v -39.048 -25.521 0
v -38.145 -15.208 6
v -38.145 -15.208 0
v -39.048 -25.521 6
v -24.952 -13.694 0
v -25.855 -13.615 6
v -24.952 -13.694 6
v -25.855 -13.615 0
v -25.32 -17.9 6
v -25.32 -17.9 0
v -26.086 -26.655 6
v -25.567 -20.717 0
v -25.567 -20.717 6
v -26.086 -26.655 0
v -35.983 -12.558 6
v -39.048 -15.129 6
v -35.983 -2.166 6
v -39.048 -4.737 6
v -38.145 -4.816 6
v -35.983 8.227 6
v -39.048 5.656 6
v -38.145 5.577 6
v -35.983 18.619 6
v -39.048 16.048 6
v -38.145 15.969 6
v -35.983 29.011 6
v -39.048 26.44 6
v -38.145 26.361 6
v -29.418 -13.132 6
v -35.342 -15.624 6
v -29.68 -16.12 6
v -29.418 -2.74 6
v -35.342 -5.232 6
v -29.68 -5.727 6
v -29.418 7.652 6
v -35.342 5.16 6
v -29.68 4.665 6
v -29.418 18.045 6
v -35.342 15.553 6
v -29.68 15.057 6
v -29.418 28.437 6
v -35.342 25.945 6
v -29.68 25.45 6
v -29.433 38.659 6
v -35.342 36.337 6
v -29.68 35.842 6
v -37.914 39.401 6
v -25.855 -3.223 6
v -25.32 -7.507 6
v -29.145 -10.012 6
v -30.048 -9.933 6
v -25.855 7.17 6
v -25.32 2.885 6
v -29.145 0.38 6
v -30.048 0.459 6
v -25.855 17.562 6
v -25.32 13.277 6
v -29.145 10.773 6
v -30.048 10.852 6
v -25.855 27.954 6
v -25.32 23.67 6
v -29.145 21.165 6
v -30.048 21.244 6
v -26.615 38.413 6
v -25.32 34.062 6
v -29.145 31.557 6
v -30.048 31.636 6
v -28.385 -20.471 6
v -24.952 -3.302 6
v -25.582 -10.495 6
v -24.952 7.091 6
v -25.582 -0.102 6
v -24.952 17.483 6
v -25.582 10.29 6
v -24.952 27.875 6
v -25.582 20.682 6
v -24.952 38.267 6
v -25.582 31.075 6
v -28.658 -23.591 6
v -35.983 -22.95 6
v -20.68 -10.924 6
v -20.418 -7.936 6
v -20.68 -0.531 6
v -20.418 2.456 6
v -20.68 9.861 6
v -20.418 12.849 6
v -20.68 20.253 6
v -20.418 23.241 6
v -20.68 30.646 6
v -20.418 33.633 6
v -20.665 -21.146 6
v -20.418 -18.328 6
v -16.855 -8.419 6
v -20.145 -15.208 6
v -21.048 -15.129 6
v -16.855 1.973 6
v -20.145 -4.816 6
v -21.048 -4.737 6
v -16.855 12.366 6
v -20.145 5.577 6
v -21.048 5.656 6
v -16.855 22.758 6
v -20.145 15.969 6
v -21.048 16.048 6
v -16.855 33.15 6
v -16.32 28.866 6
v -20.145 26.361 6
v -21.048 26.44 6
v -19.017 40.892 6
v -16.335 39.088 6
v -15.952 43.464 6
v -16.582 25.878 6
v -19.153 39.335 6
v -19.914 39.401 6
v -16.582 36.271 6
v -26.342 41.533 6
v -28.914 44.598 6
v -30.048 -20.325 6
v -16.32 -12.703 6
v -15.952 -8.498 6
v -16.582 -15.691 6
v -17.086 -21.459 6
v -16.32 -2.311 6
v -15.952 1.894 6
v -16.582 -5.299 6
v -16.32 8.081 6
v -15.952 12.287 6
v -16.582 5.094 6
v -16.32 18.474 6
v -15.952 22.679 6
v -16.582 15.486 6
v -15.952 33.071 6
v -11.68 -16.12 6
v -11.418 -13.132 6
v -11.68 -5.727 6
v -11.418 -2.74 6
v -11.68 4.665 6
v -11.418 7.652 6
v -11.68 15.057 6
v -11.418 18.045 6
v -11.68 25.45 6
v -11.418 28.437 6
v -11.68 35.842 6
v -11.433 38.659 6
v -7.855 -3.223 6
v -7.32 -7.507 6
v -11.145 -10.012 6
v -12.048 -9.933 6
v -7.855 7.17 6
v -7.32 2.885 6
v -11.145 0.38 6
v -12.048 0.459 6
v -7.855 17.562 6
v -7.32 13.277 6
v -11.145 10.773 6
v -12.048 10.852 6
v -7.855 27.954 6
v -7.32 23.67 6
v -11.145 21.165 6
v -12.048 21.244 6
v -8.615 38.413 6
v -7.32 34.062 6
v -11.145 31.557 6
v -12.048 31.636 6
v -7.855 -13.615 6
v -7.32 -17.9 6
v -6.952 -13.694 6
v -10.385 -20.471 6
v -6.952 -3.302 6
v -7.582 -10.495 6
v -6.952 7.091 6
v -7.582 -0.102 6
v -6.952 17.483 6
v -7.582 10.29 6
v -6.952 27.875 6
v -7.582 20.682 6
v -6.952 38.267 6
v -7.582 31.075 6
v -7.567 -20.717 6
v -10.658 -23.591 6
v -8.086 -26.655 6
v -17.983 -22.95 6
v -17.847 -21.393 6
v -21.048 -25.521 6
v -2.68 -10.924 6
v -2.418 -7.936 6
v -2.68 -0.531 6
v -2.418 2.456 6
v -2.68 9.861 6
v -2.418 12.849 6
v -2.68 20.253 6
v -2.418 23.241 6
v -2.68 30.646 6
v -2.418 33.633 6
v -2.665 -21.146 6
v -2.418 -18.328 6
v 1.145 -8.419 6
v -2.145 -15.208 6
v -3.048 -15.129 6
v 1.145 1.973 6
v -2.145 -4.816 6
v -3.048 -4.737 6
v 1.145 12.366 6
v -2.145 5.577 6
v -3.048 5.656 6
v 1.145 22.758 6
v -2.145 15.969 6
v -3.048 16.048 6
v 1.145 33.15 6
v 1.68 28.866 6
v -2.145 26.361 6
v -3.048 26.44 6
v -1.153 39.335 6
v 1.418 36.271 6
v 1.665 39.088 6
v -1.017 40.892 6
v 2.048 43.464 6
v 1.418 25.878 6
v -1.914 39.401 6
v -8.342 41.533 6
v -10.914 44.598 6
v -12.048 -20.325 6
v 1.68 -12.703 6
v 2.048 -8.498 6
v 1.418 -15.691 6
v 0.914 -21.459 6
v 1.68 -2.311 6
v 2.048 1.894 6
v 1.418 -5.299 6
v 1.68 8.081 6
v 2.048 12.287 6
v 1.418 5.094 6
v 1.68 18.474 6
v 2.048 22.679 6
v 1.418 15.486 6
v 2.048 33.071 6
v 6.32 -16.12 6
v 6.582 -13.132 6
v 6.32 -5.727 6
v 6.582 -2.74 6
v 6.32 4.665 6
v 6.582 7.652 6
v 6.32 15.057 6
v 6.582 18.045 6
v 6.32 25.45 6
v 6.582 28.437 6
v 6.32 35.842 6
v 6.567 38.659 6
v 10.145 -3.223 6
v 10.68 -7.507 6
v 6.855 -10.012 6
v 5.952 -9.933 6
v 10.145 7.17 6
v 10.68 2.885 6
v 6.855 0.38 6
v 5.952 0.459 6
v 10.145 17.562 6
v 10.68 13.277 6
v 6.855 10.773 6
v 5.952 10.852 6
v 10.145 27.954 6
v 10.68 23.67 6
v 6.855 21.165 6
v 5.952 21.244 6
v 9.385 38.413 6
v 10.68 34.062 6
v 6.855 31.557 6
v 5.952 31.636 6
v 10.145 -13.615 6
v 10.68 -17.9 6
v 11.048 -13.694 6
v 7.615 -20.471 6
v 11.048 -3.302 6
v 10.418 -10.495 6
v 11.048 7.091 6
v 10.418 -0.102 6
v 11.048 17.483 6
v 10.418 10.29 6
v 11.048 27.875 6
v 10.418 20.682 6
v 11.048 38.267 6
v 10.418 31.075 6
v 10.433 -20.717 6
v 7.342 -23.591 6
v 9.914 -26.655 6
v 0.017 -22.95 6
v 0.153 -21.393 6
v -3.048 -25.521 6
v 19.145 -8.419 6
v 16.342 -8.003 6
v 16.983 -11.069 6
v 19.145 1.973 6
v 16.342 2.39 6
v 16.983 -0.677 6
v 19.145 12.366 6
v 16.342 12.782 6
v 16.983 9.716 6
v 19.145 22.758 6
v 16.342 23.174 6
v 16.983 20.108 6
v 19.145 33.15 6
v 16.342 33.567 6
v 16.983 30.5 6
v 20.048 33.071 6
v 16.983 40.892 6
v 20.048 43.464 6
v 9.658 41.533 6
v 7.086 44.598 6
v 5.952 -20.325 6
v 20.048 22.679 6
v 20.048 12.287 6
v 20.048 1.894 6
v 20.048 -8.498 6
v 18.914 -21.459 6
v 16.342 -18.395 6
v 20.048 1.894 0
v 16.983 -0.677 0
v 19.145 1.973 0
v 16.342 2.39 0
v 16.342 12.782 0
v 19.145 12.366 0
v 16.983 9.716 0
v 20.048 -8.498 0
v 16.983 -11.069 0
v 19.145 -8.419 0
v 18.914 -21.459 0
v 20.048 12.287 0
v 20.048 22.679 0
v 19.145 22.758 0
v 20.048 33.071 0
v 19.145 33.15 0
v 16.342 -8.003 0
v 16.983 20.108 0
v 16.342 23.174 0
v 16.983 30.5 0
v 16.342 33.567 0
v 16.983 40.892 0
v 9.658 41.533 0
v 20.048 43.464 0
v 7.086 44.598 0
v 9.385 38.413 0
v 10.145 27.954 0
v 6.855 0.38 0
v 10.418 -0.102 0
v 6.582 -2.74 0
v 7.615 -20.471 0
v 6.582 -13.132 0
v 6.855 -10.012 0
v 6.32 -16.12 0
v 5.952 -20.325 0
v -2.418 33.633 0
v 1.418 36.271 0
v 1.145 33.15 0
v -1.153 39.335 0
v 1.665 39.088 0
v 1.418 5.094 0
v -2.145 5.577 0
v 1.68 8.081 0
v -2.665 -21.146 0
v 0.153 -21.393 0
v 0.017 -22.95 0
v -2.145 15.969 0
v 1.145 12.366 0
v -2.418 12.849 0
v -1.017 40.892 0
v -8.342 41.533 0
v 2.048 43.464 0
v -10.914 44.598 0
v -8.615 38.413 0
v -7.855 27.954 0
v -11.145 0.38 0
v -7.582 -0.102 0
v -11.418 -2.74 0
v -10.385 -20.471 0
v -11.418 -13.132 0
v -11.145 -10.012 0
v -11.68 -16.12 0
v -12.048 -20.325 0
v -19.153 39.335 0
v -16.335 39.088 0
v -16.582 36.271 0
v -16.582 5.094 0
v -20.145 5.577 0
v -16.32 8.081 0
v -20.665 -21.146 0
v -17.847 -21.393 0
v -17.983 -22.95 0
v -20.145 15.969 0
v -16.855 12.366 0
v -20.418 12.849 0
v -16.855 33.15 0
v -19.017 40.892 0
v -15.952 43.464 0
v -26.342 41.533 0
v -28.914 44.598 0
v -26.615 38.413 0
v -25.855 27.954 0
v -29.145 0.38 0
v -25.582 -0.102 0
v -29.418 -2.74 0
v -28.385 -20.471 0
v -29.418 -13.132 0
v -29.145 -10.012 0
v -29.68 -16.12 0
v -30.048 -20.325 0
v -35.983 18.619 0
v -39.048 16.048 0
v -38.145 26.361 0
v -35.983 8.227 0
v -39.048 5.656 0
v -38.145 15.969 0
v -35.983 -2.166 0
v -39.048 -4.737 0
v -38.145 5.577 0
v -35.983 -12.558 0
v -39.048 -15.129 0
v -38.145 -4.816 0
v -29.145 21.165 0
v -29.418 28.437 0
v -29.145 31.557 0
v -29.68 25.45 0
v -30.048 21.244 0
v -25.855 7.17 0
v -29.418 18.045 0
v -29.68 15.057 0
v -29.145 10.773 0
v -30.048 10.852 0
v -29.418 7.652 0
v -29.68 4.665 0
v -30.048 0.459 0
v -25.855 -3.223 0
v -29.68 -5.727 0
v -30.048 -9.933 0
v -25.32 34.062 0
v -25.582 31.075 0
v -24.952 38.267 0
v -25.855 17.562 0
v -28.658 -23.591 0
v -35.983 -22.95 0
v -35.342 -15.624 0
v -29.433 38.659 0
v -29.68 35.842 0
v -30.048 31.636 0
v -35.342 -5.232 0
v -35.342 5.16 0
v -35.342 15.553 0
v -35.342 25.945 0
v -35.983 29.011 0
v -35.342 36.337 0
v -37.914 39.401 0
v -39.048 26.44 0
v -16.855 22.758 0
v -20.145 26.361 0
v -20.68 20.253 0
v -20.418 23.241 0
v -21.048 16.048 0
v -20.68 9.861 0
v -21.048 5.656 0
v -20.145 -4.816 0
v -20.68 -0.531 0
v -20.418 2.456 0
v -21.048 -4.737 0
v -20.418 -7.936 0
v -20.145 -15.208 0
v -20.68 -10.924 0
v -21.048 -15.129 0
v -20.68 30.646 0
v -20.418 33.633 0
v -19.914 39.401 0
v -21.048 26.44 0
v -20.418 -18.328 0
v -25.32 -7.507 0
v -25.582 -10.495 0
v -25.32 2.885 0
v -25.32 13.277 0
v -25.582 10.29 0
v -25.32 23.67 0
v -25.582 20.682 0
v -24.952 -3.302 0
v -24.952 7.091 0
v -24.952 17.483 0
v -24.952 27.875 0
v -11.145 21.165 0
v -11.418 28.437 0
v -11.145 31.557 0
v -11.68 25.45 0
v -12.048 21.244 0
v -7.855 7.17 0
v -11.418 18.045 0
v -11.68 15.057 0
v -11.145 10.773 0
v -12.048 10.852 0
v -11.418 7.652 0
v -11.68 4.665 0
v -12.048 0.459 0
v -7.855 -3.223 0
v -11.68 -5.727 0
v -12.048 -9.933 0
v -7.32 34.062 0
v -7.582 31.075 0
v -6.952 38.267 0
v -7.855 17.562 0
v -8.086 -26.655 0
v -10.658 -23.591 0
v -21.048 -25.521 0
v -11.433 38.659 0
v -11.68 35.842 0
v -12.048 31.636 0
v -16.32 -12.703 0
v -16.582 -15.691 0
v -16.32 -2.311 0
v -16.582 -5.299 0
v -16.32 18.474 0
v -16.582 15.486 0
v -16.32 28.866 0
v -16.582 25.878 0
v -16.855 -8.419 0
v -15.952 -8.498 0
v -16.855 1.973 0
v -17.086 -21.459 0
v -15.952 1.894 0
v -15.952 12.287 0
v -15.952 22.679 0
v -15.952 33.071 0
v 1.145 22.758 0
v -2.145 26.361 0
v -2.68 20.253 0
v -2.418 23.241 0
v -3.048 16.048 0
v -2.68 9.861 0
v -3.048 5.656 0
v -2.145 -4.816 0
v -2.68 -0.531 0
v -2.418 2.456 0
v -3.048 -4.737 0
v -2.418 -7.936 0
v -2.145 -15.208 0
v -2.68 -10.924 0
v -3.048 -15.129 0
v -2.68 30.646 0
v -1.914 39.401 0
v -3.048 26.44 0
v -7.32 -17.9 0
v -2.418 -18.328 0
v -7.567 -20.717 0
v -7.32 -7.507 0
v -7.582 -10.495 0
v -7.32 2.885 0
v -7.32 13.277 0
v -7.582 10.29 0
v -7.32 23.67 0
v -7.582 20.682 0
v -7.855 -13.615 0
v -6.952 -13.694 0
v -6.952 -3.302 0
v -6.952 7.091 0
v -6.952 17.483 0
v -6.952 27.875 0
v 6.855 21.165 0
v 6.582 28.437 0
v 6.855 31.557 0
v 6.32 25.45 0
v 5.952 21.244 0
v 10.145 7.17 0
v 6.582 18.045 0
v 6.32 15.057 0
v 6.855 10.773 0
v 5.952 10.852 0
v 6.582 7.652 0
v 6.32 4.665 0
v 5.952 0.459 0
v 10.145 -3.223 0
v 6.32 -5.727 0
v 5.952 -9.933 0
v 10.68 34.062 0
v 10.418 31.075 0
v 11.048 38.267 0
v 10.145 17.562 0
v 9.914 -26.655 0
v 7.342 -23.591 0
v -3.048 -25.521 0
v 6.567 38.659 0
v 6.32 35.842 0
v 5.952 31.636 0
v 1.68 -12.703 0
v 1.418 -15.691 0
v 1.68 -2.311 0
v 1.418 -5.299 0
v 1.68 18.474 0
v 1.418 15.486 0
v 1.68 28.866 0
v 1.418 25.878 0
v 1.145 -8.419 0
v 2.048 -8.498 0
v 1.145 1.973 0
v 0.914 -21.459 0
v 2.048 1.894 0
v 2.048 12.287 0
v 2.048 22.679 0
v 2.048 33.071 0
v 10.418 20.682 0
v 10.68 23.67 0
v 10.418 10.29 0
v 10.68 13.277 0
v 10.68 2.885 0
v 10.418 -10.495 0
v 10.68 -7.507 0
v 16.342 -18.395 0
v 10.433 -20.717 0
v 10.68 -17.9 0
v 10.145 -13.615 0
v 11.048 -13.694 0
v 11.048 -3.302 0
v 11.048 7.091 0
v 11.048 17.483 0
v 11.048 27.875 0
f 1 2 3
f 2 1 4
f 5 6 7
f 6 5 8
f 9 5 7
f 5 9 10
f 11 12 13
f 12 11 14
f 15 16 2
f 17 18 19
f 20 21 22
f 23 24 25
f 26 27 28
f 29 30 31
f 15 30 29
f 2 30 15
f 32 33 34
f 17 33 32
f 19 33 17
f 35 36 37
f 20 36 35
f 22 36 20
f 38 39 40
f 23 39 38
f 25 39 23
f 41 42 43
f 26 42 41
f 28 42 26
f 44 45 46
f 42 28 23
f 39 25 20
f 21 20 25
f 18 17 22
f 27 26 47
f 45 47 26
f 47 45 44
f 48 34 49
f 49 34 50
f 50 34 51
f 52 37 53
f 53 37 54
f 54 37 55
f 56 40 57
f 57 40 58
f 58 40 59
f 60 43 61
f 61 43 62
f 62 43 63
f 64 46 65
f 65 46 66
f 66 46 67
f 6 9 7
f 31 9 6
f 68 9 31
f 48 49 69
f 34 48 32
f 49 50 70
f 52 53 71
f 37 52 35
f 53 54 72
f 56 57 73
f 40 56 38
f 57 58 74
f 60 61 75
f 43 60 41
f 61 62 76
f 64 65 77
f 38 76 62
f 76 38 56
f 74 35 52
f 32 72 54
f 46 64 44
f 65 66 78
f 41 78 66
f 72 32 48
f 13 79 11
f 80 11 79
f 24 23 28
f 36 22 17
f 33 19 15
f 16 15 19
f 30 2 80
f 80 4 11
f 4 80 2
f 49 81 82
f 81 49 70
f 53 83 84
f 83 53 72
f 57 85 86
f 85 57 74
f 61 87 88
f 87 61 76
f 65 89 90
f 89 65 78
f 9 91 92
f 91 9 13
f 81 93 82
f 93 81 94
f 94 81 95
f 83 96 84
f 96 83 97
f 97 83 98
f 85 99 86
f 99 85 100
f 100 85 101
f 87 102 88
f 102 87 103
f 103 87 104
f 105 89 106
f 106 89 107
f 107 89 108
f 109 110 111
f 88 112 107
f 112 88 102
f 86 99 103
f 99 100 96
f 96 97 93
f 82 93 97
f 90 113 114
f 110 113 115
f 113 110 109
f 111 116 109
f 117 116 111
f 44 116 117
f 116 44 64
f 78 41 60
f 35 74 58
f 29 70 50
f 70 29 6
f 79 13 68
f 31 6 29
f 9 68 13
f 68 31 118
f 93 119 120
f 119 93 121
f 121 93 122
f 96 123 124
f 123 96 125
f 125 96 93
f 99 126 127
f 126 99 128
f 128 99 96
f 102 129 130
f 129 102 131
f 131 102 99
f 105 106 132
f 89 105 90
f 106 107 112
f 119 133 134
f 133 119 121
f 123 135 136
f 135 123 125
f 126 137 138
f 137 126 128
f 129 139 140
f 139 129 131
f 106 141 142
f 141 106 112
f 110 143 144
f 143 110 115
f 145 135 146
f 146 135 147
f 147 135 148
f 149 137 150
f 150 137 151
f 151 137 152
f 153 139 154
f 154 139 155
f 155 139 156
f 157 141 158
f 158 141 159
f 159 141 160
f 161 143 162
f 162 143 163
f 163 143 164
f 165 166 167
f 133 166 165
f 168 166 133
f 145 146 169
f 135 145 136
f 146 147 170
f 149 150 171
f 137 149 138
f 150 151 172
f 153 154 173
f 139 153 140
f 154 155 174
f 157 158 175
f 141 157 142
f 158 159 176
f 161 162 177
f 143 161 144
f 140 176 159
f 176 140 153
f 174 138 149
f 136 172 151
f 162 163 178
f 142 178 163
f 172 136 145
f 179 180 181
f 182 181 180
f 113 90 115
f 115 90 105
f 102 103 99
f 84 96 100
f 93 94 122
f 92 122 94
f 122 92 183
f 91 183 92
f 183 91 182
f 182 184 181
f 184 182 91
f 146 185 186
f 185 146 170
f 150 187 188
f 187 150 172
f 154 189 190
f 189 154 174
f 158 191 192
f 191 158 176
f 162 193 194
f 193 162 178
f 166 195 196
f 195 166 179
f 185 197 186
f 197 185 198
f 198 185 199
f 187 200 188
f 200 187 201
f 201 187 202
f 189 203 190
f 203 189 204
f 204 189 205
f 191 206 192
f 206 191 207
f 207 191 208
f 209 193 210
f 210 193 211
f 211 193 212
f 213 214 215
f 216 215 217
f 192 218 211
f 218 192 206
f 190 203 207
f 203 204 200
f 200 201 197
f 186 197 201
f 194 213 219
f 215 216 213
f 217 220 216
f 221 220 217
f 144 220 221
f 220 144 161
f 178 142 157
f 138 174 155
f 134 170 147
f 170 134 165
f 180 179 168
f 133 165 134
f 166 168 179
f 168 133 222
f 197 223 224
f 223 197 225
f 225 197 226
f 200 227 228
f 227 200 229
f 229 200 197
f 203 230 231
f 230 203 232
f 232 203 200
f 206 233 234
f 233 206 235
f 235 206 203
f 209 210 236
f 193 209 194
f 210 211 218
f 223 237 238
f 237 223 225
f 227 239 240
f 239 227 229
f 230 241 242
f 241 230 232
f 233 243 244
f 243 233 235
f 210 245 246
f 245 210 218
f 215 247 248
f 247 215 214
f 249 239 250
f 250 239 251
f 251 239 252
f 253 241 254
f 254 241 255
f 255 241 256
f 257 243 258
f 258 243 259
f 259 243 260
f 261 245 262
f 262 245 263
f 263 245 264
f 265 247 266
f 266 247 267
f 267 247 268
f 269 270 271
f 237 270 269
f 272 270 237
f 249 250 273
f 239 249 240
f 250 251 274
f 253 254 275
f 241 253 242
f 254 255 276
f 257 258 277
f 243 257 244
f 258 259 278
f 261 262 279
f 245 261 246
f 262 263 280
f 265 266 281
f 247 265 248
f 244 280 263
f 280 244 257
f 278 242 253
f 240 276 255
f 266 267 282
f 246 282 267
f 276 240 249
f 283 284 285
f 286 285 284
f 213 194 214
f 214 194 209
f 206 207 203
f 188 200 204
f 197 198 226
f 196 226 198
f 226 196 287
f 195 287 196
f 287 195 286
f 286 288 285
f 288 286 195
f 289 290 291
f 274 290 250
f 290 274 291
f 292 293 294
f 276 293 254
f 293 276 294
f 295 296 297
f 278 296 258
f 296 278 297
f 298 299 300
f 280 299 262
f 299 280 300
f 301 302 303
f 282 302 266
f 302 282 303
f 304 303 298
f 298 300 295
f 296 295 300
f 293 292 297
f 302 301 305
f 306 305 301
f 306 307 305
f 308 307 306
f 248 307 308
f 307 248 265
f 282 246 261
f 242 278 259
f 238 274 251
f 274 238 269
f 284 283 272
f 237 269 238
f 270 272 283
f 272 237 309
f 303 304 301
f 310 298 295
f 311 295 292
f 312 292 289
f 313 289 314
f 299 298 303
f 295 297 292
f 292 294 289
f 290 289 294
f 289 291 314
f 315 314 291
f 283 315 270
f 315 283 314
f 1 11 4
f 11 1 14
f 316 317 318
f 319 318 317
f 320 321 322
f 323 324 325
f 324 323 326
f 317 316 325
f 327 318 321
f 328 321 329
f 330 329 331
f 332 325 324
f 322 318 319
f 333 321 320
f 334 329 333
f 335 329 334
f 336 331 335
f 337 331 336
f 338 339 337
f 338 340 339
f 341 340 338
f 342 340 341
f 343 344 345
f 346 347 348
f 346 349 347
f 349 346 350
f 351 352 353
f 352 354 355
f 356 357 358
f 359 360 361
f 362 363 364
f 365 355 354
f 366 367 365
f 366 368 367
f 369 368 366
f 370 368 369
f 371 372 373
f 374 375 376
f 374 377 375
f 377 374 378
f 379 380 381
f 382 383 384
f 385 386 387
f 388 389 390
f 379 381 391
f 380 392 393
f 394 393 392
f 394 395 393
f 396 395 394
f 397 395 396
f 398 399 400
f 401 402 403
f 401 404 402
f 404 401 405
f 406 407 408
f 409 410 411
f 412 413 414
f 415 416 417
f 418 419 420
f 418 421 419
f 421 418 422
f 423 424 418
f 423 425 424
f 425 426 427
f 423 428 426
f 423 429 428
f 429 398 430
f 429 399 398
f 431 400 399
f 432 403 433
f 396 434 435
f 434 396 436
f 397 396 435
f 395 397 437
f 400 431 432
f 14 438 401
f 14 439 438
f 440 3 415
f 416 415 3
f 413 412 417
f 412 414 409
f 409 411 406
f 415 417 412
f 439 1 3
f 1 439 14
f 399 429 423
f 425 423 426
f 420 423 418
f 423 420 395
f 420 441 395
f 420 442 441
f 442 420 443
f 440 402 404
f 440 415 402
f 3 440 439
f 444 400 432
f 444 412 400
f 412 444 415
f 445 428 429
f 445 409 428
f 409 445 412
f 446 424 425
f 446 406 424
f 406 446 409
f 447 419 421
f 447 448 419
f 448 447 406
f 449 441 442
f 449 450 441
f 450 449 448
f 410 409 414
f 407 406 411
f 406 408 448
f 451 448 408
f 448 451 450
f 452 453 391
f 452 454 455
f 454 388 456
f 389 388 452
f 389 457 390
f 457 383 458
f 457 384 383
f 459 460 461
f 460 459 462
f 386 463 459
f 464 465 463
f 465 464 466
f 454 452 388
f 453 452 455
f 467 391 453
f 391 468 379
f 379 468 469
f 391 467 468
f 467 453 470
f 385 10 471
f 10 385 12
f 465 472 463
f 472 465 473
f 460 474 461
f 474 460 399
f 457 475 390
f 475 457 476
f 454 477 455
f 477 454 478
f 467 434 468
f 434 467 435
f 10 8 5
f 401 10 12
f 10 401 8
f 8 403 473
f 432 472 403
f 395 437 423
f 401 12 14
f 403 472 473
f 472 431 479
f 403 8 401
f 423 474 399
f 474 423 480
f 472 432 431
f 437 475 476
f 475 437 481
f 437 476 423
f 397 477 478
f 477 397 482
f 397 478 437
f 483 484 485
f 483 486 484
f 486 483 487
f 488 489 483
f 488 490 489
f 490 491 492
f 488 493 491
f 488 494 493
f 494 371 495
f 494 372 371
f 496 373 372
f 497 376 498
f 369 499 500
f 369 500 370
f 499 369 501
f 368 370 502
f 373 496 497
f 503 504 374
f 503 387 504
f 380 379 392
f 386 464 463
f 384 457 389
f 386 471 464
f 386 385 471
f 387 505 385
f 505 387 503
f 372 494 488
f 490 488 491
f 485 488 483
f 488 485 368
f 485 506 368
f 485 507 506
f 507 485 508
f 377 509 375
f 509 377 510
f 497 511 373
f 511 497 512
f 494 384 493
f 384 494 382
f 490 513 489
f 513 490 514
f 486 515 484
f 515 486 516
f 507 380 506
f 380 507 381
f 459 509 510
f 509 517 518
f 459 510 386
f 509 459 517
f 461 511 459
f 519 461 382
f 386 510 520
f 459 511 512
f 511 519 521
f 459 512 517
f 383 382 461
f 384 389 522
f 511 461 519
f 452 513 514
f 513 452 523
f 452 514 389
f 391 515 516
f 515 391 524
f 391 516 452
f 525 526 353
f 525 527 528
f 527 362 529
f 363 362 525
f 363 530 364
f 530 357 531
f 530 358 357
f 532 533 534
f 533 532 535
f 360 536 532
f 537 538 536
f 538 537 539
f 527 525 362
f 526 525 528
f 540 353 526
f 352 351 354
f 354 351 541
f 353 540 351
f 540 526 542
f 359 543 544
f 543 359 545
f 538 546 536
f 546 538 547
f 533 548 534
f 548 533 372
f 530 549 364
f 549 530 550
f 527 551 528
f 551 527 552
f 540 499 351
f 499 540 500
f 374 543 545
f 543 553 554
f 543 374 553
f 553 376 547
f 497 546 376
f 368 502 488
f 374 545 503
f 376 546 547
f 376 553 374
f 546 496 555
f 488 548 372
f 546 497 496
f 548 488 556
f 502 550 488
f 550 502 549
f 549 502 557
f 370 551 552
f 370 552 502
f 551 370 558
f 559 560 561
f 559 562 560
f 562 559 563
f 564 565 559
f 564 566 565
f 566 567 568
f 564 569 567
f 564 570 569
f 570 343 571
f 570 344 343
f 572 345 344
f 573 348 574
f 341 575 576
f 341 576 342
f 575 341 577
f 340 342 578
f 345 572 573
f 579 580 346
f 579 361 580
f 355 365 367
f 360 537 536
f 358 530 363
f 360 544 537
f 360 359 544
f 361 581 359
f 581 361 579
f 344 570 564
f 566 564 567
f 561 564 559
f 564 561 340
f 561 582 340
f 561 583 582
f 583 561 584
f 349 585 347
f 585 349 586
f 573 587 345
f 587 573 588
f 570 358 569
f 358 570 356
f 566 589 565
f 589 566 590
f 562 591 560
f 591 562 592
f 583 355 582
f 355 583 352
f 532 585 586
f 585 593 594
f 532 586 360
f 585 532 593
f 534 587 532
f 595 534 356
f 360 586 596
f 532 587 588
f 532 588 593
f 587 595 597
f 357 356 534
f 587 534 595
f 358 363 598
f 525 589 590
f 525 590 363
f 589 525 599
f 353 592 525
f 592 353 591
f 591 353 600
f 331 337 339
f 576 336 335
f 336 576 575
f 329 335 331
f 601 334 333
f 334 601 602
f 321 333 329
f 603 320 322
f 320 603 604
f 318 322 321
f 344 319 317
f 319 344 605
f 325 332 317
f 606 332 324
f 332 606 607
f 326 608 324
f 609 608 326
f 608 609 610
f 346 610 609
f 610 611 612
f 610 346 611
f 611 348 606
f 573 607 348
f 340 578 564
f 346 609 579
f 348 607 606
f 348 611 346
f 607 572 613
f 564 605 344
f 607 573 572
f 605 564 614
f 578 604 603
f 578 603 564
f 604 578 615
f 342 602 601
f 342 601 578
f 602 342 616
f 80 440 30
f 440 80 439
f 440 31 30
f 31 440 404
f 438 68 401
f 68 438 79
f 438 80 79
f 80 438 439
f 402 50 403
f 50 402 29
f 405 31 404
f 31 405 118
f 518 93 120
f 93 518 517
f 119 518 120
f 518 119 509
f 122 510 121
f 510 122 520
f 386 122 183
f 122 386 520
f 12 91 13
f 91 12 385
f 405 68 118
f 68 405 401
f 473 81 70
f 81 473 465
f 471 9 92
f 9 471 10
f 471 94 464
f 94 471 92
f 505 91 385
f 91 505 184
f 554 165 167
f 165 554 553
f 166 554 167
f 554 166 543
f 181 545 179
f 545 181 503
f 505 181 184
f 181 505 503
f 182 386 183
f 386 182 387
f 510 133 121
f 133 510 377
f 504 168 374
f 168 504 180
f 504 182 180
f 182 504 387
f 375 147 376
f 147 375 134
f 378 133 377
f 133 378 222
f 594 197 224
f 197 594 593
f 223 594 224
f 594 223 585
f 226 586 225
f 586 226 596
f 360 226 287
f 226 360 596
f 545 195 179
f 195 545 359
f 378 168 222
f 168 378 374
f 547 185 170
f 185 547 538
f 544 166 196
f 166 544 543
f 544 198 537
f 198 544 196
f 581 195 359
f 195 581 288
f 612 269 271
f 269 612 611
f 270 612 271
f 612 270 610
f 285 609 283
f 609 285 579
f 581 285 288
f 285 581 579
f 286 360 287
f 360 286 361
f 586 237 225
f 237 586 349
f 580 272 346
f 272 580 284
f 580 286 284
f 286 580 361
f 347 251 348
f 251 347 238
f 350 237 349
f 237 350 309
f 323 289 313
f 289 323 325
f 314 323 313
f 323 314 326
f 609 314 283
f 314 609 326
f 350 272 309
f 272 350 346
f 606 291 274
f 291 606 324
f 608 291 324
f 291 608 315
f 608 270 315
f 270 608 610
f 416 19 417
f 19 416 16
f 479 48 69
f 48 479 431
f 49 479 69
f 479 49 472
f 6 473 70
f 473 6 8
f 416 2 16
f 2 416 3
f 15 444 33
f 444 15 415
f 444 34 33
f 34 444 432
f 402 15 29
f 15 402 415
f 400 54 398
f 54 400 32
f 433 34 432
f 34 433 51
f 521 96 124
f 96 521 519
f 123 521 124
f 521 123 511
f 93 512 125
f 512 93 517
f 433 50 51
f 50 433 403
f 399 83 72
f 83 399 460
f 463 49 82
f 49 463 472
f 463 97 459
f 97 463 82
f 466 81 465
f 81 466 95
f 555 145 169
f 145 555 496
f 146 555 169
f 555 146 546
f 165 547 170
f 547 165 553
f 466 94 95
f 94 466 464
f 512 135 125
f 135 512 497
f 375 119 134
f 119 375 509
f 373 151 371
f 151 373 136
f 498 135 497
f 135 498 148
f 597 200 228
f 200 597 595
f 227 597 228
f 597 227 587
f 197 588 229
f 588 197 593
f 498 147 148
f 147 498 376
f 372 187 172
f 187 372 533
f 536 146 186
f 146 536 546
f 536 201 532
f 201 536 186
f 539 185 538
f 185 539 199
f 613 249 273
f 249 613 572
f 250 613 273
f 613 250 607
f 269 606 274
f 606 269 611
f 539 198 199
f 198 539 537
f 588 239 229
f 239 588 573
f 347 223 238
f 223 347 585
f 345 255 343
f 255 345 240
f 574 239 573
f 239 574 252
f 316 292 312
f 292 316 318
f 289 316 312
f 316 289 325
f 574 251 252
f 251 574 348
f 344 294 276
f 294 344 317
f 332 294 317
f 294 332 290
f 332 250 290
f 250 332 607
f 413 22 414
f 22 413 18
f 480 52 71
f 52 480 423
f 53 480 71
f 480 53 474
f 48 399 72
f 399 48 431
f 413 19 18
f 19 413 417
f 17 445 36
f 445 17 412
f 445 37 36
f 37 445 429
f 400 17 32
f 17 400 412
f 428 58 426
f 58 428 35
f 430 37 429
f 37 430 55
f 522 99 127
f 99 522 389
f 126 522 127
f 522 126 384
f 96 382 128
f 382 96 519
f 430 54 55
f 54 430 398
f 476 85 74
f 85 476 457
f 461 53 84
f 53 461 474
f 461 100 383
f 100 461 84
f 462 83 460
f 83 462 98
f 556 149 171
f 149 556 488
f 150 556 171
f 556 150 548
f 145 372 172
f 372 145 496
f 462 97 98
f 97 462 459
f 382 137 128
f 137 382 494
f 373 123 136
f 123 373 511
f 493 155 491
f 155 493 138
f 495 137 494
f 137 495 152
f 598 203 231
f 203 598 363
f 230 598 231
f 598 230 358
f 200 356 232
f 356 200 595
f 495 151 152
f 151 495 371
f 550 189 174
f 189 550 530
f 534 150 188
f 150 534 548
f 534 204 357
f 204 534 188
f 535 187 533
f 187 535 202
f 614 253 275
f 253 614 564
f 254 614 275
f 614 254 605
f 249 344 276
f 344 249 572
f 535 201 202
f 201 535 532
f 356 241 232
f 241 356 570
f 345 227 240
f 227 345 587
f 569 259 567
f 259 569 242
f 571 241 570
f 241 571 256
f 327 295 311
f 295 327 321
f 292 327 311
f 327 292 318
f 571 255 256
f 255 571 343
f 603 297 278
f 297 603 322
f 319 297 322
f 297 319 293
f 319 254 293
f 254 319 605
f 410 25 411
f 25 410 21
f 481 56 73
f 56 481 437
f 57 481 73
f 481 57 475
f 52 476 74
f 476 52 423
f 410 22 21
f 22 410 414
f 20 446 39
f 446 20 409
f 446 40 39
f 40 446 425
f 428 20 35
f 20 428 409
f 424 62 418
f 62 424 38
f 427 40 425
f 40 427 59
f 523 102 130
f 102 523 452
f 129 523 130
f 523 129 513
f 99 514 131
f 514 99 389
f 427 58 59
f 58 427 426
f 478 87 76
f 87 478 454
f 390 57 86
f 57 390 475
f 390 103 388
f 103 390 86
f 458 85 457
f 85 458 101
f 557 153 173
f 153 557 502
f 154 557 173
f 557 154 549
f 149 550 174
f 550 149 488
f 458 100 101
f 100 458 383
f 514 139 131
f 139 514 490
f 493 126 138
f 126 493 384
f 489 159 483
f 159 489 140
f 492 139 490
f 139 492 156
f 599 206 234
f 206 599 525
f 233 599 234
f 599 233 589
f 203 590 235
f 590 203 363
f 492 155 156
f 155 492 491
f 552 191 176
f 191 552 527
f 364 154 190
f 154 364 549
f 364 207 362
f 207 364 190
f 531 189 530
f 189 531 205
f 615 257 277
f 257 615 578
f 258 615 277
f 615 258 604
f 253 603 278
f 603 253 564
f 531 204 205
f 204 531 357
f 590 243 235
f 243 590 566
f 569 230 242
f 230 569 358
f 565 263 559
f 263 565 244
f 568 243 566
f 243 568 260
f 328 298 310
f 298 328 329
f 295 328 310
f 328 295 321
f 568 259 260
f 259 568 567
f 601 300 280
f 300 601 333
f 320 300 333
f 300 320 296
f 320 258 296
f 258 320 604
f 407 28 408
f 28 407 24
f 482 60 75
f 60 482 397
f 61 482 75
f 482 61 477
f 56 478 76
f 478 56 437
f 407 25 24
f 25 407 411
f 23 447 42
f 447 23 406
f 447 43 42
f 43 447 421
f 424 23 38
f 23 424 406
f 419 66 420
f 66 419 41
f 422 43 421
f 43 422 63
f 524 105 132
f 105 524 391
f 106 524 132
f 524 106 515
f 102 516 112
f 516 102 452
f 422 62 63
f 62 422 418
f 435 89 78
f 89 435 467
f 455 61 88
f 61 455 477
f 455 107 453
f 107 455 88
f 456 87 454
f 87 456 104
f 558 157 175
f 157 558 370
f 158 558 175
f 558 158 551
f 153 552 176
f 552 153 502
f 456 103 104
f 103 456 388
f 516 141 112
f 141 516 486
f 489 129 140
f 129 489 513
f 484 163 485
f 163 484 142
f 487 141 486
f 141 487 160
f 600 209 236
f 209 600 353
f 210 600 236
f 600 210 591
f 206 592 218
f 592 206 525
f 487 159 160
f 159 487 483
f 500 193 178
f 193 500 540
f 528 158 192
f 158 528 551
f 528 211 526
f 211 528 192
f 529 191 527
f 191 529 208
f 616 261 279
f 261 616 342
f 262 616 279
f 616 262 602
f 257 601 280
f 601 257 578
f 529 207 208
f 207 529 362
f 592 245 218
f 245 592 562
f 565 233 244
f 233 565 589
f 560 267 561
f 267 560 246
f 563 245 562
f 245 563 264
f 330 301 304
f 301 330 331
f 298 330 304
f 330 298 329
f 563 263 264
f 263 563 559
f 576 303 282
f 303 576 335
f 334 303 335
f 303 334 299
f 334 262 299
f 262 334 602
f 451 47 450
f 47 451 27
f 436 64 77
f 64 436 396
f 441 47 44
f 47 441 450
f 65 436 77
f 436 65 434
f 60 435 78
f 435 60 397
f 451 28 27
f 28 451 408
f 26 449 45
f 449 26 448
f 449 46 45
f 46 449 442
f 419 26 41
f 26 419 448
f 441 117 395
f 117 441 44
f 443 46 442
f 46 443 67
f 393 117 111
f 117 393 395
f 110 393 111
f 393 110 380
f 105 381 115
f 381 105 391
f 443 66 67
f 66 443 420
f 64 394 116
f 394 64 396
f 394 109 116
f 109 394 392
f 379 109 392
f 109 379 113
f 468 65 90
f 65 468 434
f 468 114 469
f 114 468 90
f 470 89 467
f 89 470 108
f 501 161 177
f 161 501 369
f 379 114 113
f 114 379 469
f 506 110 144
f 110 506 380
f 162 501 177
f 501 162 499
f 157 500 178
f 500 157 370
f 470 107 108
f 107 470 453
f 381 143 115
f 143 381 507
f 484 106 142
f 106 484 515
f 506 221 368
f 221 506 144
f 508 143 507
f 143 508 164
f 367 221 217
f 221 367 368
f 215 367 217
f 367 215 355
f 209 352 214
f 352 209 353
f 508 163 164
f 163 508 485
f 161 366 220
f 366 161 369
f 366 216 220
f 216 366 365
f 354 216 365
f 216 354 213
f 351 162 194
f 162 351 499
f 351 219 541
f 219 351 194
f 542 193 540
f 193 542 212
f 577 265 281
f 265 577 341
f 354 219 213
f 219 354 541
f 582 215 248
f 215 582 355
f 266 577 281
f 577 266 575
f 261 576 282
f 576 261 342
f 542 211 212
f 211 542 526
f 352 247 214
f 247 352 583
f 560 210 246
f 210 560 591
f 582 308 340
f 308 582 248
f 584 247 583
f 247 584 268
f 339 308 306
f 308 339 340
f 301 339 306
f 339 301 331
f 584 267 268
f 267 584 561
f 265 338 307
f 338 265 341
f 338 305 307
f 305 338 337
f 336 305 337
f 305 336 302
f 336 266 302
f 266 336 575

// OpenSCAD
// [FL_INDEX: keywords="openscad, 3d_parametric, Pattern_Maker, csg_solid" | COT="Parametric OpenSCAD design from 3DCodeverse"]
// Title: Pattern Maker

length=60; //[20:100] 
width =50;  //[20:100] 
pattern_thickness=3;//[3:10]

sides=4;//[3:Triangle (3-sided),4:Square (4-sided),5:Pentagon (5-sided),6:Hexagon (6-sided),7:Heptagon (7-sided),8:Octogon (8-sided),9:Nonagon (9-sided),10:Decagon (10-sided),11:Hendecagon (11-sided),12:Dodecagon (12-sided),30:Circle (3w0-sided)]
radius=6;//[2:25]
polygon_edge_thickness=2;//[1.0:10.0]
overlap_factor=10; //[0:100]
polygon_rotation=40;//[0:120]
stretch_off_on=0;//[0:OFF, 1:ON]
//% X stretch.
polygon_stretch=100;//[-20:100]




HONEYCOMB(width,length,9,radius,overlap_factor,polygon_edge_thickness,sides,polygon_stretch);
					

module HONEYCOMB(w,l,h,r,overlapFactor,polyEdge,sides,stretch,){
columns =l/(r*3)+1;
rows = w/(r*sqrt(3)/2*2)+3;

//translate([-w/1.3,l/1.8,pattern_thickness])
translate([-w,-l/2,pattern_thickness])

//rotate([0,0,-90])
	for(y = [1:rows-1]){
		translate([0,r*sqrt(3)/2*y*2,0])
		scale([pow(1+y/(21),0),1,1])
		for(x = [1:columns-1]){
			translate([r*x*3,0,0])
			for(i = [0:1]){
				translate([r*1.5*i,r*sqrt(3)/2*i,0])
				rotate([0,0,polygon_rotation])
				difference(){
					if(sides < 5){
						scale([1,pow((stretch+100)/100,stretch_off_on),1])
						cylinder(h=2*pattern_thickness, r = r+polyEdge+(r*overlapFactor/50), center = true, $fn = sides);
					} else {
						scale([1,pow((stretch+100)/100,stretch_off_on),1])
						cylinder(h=2*pattern_thickness, r = r+(r*overlapFactor/50), center = true, $fn = sides);
					}
					scale([1,pow((stretch+100)/100,stretch_off_on),1])
					cylinder(h=2.05*pattern_thickness, r = r-polyEdge+(r*overlapFactor/50), center = true, $fn = sides);
				}
			}
		}
	}
}
//derived from Customizable Necktie by Keenan, published	 Mar 2, 2013
//http://www.thingiverse.com/thing:56209




			
				
